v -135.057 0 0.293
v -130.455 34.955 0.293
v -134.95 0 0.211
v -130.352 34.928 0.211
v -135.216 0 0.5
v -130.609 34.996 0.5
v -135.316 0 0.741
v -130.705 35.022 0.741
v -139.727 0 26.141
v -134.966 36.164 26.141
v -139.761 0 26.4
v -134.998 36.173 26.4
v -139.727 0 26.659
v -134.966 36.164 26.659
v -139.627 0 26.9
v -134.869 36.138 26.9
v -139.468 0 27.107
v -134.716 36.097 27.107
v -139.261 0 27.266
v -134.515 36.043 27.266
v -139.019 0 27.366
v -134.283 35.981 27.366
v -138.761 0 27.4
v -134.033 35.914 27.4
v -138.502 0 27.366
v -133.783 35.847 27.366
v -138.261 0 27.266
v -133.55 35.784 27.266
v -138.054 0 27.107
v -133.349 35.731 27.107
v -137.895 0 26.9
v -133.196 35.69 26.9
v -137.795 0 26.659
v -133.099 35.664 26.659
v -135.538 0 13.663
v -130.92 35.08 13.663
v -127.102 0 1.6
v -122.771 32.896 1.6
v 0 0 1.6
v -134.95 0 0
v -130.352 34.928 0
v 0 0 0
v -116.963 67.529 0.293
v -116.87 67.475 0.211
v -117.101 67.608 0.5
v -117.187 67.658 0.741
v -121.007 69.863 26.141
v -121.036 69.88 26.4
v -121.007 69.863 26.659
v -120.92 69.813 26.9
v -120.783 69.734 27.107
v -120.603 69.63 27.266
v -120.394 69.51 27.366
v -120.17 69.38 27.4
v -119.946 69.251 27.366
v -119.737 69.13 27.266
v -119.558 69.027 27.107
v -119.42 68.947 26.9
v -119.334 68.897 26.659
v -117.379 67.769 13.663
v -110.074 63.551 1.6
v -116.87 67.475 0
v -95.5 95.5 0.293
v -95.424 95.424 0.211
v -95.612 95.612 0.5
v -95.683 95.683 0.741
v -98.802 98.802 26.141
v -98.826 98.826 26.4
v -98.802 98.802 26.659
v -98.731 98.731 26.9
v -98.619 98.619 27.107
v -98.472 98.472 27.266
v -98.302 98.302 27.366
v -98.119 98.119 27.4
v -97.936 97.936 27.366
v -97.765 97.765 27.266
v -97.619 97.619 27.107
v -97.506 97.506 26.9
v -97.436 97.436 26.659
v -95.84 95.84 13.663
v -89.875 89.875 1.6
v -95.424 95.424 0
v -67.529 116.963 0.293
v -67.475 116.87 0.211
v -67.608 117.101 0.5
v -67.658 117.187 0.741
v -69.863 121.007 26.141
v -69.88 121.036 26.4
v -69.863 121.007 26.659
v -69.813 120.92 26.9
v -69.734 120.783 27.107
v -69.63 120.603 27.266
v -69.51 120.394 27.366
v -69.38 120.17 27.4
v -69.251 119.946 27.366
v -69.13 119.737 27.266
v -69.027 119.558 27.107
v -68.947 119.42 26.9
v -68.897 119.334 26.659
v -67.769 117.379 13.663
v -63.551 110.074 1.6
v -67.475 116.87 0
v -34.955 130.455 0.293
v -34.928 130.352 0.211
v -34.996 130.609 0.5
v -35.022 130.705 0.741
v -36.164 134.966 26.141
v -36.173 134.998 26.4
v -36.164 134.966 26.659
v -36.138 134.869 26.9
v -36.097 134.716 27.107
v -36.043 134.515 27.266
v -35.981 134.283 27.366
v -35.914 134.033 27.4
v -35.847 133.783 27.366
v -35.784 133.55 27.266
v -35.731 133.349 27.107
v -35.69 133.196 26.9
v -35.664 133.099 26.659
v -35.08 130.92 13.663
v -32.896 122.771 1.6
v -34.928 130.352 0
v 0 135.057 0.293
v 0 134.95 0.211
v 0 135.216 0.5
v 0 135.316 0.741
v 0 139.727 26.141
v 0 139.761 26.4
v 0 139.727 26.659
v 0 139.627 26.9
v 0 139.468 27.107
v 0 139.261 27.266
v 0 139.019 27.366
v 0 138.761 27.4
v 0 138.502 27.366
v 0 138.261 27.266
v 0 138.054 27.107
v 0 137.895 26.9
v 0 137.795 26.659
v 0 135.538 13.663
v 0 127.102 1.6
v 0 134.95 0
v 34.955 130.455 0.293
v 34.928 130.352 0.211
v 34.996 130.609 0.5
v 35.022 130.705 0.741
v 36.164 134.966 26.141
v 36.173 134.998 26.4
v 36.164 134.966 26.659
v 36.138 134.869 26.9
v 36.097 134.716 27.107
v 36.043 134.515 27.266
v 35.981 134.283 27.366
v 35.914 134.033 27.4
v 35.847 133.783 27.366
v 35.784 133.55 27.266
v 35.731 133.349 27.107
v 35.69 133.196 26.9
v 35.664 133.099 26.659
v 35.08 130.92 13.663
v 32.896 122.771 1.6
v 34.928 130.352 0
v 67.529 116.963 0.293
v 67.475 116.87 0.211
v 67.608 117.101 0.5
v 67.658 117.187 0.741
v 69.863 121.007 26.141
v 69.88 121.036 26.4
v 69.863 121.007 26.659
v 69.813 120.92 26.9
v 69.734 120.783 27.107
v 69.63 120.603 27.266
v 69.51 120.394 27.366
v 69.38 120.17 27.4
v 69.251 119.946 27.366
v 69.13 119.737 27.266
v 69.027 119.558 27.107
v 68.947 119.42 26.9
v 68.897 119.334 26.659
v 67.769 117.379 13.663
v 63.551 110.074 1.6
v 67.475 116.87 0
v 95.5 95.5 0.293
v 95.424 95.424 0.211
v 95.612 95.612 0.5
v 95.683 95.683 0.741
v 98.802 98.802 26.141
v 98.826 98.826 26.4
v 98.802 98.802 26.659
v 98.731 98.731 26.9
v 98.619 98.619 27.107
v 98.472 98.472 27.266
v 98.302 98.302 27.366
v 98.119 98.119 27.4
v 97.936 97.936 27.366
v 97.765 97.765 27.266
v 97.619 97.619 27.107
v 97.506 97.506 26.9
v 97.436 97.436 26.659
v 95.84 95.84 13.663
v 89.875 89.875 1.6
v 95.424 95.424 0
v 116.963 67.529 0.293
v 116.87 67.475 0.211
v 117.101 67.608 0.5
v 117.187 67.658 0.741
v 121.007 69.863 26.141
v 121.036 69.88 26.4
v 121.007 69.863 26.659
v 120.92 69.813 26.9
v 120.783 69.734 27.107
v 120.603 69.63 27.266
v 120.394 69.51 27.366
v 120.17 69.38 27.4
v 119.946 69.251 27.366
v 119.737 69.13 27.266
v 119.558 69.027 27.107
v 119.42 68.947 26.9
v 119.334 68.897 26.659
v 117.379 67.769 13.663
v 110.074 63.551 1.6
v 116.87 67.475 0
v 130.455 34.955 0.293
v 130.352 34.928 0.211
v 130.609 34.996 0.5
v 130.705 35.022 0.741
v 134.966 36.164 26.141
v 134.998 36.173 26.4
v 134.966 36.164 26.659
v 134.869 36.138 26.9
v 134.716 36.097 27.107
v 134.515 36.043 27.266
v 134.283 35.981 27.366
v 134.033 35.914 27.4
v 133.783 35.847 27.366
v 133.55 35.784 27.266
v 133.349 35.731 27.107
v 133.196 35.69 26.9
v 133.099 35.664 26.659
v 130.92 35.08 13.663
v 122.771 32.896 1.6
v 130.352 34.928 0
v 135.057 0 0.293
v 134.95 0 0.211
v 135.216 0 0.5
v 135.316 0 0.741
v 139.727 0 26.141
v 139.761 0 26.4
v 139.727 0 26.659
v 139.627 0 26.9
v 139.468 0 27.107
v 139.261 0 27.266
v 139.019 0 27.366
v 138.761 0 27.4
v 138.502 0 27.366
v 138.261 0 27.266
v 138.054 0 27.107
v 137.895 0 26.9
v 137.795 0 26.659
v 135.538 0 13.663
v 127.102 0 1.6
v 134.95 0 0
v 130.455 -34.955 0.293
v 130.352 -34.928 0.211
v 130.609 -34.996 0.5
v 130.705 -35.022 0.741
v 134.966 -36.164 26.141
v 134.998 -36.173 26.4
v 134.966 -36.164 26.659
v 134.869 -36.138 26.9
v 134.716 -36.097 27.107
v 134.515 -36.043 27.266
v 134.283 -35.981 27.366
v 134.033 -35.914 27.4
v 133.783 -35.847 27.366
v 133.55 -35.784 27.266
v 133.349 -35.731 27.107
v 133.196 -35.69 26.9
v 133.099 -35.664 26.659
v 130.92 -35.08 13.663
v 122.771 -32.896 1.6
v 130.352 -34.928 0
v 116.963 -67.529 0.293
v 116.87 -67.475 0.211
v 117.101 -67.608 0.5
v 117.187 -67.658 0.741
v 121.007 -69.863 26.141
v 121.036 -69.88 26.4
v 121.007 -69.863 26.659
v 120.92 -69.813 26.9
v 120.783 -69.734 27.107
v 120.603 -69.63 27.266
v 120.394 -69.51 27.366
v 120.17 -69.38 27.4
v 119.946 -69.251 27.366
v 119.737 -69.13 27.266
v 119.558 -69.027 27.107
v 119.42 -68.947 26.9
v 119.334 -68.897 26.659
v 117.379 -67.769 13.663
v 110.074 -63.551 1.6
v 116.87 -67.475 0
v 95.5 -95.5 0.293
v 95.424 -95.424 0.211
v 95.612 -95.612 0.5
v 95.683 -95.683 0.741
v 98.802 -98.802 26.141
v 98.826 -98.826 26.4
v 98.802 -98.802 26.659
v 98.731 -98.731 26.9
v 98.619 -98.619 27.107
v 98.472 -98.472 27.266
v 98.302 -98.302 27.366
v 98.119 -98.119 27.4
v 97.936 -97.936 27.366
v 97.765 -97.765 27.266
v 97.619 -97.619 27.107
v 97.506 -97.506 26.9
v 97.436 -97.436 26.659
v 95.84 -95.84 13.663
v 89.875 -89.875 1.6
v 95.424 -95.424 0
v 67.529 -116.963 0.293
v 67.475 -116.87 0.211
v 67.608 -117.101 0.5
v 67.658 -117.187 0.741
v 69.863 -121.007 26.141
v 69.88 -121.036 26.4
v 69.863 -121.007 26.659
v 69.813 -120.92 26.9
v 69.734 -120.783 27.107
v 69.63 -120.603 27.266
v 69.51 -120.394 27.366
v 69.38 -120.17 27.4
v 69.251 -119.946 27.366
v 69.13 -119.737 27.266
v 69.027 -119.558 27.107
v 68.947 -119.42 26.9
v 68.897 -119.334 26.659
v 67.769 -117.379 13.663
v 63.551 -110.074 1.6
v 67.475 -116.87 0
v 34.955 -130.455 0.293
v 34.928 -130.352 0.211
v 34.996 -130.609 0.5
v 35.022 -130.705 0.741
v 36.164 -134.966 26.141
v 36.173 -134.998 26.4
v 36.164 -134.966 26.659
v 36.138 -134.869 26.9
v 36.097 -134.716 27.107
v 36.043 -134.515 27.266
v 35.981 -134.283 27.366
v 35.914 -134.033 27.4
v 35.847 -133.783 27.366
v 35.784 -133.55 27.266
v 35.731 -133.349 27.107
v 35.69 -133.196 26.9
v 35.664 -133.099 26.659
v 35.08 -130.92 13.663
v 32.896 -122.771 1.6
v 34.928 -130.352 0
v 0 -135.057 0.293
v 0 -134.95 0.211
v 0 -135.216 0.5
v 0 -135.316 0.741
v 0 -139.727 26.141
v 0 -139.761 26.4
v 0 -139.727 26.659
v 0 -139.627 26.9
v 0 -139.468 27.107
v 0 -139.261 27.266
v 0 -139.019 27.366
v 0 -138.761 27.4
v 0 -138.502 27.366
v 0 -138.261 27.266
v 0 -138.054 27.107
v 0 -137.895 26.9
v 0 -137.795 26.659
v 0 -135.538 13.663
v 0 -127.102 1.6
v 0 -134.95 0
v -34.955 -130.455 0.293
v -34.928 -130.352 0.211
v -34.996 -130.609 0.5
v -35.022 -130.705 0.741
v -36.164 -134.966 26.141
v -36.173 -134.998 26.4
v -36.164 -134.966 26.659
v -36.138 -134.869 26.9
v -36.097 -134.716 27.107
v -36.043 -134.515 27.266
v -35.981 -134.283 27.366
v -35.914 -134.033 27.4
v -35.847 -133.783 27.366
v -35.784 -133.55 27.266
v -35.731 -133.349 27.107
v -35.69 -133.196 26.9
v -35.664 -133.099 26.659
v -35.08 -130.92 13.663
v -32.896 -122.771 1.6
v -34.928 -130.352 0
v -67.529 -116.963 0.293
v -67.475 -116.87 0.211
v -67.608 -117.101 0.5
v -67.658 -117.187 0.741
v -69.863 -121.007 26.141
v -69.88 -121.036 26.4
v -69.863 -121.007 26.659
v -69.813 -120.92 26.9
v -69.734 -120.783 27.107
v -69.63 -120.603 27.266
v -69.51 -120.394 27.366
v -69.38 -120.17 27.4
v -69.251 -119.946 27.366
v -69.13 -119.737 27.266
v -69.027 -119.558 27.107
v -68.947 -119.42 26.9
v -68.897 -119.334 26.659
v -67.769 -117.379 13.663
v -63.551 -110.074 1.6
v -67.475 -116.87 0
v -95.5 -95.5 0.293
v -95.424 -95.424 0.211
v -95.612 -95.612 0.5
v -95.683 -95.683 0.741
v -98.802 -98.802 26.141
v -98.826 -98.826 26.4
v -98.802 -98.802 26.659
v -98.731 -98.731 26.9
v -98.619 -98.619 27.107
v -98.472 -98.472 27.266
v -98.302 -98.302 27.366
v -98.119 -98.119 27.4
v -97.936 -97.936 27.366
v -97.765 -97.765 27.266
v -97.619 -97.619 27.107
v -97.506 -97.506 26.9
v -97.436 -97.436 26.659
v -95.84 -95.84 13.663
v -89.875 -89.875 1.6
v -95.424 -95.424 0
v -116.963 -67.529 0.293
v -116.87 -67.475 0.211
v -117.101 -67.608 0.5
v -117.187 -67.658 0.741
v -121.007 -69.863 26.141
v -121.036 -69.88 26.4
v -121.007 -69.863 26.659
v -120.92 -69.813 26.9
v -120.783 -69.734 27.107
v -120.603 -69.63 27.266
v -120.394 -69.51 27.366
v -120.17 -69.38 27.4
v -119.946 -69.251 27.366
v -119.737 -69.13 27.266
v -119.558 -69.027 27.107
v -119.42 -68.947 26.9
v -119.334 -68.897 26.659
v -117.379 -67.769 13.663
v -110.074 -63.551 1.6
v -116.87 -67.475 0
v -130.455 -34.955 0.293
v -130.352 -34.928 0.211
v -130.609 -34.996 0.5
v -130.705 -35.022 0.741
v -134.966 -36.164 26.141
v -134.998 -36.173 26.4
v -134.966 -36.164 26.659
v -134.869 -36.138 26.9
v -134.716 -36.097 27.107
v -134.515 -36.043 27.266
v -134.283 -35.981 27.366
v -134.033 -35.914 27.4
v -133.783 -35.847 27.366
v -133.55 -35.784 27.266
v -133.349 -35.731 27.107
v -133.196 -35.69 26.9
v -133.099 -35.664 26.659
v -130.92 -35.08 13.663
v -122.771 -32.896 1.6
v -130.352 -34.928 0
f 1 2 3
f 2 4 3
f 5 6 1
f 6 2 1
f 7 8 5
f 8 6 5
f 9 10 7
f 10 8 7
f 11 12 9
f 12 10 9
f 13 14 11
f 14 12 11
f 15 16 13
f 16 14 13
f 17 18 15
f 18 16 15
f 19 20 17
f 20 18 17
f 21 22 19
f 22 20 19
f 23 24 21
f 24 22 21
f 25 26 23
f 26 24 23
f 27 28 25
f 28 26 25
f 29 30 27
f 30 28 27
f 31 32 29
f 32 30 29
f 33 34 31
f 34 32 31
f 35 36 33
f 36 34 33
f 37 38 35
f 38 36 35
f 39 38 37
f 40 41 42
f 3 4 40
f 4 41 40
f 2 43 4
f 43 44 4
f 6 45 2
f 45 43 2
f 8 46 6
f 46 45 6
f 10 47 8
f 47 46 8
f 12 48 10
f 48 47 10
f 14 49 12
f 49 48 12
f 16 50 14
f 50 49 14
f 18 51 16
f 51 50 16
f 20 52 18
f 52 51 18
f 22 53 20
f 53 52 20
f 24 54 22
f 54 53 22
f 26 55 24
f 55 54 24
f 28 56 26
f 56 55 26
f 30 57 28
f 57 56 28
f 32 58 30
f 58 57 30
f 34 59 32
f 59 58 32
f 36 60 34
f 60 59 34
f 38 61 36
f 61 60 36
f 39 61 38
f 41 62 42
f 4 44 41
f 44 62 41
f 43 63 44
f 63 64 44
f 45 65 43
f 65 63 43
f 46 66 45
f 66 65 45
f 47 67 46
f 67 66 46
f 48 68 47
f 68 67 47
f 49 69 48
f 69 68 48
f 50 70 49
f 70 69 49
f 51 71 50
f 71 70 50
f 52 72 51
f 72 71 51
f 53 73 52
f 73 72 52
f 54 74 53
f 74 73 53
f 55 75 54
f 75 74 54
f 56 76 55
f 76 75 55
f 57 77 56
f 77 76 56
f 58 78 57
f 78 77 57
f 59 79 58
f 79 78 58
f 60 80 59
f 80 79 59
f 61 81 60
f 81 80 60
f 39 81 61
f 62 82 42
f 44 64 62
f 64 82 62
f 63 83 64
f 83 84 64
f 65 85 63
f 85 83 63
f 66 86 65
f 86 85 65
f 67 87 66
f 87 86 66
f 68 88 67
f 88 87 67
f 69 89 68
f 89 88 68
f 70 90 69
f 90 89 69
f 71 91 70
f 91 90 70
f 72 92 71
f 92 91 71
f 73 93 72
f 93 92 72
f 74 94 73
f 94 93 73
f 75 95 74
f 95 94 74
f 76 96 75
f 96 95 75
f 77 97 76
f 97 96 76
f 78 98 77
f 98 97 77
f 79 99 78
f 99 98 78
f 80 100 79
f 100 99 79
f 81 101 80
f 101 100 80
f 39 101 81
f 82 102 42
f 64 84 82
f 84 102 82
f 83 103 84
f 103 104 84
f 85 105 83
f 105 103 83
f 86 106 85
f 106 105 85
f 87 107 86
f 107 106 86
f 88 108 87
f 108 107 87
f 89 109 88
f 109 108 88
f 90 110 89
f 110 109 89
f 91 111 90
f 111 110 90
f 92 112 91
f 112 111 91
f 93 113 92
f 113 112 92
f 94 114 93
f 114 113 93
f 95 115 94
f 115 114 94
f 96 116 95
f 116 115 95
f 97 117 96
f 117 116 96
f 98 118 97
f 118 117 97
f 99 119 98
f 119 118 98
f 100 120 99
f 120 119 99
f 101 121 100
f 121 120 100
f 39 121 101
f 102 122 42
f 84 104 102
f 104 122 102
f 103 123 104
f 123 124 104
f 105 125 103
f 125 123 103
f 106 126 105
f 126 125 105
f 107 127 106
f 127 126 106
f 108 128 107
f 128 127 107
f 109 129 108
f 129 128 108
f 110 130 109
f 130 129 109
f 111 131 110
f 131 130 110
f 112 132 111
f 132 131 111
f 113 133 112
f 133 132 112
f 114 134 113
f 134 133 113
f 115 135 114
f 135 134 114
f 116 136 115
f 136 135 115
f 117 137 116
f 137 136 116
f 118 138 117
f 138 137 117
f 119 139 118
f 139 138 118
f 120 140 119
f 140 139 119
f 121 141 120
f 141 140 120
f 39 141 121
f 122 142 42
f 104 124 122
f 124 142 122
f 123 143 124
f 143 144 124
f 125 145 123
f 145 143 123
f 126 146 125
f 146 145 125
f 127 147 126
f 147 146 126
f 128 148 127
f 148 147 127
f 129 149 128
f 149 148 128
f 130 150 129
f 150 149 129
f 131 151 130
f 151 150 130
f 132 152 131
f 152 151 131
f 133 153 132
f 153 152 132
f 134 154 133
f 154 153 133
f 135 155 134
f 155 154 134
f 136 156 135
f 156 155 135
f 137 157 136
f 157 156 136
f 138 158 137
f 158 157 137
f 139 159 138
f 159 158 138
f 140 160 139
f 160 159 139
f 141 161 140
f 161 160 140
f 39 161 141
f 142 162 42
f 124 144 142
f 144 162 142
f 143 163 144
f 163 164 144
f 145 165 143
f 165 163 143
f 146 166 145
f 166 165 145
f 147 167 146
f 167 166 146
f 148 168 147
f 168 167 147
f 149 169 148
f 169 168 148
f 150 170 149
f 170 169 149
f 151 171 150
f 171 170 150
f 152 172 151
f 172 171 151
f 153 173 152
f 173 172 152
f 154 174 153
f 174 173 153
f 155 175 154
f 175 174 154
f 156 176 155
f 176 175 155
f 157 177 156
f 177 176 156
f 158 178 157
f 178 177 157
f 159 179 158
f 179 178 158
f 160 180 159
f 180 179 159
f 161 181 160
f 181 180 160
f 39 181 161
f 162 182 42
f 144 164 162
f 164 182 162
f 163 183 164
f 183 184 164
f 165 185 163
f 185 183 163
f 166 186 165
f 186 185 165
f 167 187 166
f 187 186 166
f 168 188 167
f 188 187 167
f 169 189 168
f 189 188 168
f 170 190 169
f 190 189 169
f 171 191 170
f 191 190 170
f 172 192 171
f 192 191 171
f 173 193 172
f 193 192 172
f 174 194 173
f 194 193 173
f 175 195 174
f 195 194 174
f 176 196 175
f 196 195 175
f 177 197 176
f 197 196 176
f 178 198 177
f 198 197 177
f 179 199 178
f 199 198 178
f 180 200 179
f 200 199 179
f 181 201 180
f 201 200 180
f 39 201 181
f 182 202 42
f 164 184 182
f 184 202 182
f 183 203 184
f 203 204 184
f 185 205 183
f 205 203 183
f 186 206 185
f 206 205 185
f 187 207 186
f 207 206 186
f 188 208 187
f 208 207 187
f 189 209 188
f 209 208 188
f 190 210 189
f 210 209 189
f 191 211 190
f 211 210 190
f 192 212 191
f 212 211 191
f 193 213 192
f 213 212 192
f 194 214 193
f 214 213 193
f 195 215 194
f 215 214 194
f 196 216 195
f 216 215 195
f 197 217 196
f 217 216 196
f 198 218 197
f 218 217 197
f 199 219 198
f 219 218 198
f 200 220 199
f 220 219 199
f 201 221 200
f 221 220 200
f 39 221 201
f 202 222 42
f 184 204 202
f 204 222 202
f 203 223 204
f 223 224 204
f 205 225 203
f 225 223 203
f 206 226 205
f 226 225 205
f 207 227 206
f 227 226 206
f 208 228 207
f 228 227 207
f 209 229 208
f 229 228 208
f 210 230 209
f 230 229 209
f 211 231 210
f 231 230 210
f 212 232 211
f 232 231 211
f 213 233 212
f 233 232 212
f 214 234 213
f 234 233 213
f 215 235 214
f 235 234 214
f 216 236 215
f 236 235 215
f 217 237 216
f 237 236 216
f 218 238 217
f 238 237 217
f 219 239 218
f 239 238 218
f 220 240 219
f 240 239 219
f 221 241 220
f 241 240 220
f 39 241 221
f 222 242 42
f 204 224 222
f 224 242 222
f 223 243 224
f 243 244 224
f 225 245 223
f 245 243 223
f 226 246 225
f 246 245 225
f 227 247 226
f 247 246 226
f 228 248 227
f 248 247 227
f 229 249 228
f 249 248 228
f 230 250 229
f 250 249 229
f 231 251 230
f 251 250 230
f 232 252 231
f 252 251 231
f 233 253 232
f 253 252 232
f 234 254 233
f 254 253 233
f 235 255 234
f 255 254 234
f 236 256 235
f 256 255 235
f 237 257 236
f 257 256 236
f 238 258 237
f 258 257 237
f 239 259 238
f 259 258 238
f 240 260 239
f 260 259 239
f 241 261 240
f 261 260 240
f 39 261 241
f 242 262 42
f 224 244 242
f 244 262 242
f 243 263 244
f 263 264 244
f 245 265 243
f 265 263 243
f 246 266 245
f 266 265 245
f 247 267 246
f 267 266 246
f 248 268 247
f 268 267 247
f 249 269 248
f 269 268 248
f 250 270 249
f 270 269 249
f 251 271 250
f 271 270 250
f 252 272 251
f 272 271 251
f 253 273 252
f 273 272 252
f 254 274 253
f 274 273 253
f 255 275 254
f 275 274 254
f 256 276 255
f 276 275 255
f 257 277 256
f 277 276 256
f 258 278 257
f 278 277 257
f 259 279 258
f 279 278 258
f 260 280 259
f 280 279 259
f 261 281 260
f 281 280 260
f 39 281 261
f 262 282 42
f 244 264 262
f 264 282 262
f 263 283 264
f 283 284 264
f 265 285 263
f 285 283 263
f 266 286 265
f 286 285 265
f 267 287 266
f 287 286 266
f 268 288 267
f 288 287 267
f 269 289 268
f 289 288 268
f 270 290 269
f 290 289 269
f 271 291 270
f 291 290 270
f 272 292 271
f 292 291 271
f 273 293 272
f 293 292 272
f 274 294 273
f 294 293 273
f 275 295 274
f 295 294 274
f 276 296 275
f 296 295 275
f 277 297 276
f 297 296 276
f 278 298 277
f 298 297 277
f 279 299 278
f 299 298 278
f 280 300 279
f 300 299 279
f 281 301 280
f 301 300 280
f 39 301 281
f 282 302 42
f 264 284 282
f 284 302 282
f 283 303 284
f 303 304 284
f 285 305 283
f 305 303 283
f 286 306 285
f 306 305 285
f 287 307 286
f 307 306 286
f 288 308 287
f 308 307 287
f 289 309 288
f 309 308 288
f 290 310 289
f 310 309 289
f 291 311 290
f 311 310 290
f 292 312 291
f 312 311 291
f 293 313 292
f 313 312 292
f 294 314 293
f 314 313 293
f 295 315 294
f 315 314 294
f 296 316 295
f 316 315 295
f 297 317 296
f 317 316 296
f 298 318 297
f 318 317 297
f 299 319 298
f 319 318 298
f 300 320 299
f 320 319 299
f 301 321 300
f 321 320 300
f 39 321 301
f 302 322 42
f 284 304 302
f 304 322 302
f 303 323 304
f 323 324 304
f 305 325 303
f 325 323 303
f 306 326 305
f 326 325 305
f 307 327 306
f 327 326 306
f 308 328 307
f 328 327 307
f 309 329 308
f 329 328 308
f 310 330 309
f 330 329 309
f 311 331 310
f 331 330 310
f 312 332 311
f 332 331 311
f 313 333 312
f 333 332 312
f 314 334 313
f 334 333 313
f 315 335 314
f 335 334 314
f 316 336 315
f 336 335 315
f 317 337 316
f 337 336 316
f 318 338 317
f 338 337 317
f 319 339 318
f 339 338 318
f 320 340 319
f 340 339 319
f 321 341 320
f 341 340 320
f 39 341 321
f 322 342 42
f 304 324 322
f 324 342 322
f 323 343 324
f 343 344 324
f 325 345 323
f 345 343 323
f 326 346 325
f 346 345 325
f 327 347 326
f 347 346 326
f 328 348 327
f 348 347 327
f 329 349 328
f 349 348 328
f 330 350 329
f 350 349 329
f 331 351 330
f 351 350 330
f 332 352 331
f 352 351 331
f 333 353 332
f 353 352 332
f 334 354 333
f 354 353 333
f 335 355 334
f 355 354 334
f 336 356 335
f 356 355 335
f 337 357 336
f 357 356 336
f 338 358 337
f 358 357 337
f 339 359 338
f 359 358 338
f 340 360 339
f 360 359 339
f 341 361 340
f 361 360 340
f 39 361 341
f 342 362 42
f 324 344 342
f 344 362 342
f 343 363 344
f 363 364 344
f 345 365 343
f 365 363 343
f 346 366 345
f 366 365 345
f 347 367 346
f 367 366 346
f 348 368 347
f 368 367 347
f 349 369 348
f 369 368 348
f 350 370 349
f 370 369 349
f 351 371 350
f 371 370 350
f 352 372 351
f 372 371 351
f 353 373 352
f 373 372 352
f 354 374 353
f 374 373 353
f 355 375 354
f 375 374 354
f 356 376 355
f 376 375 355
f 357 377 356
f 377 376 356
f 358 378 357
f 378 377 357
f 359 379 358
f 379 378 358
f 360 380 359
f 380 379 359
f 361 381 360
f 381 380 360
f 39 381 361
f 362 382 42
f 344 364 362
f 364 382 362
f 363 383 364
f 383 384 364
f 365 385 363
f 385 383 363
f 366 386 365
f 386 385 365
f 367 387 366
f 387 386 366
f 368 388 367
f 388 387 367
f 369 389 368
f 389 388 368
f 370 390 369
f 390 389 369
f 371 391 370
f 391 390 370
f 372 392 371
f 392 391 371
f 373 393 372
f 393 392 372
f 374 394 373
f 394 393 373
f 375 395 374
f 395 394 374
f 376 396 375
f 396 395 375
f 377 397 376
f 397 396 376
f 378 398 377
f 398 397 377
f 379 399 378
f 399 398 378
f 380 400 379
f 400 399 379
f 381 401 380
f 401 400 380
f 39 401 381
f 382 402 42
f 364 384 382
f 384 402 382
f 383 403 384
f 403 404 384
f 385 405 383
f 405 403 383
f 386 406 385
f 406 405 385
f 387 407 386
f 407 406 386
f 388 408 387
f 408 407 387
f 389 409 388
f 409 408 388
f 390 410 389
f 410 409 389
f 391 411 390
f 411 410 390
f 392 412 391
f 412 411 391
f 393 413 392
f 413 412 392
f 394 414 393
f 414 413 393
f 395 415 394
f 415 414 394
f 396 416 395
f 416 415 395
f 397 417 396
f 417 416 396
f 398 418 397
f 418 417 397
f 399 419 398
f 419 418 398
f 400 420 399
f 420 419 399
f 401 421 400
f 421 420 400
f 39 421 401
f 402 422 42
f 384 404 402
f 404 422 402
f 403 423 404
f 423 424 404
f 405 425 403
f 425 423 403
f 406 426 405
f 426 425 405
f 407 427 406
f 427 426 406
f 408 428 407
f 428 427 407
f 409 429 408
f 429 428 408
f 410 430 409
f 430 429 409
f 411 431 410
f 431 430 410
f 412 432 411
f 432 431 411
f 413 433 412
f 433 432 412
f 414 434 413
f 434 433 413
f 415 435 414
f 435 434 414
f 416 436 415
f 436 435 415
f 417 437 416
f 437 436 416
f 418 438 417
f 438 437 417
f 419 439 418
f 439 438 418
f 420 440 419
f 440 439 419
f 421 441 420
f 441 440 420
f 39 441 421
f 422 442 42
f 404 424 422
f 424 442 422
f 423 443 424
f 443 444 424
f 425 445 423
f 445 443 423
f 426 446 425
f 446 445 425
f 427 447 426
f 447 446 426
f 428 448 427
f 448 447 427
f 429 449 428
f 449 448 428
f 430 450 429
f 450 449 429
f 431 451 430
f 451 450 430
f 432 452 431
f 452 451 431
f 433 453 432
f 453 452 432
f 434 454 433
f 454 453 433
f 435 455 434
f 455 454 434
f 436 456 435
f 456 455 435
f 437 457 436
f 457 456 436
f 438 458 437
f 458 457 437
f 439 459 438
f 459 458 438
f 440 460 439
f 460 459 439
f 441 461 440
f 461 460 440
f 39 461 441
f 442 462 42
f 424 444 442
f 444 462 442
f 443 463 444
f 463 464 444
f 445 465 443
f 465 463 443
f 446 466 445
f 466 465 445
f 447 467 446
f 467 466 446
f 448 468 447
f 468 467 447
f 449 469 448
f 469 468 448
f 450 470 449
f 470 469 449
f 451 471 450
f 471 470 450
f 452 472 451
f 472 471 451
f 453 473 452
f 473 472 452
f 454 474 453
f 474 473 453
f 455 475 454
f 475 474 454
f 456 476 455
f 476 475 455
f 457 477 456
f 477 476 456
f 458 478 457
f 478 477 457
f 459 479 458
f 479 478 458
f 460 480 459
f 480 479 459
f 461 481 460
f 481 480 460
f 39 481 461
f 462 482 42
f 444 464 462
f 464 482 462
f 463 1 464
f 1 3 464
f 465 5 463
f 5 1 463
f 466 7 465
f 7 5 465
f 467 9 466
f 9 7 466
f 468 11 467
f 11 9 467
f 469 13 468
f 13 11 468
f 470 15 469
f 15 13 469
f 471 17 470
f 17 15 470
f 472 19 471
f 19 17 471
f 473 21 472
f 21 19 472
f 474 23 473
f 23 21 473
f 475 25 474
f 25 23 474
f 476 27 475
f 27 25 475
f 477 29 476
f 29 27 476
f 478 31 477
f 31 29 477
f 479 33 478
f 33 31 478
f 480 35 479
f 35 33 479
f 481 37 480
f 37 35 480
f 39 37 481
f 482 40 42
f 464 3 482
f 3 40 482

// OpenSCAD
/* 
sacuers for planters.
Design 1
just a spacer under the planter to protect the wood.

design 2
a saucer that captures drained.
*/
$fn=24;
NozzleWidth = 1.0;
LayerHeight = 0.24;
InitialLayerHeight = 0.4;
mmPerInch = 25.4;
wallCount = 2;

function InchTomm(inches = 1) = inches * mmPerInch;
function height2layers(mm = 1) = mm/LayerHeight;
function layers2Height(layers) = InitialLayerHeight + ((layers - 1) * LayerHeight);
function BaseHeight() = layers2Height(6);
function WallThickness(count) = count * NozzleWidth;

Build();

module Build()
{
    Saucer(radius = InchTomm(10.5)/2, depth = mmPerInch, thickness = BaseHeight());
}

module Saucer(radius = 100, depth = mmPerInch, thickness = BaseHeight()) 
{
    rotate_extrude(convexity=10) 
    {
        union()
        {
            hull() 
            {
                translate([radius, 0, 0]) 
                    square(size=[thickness, thickness], center=false);

                square(size=[thickness, thickness], center=false);        
            }
            translate([radius +  WallThickness( wallCount ) / 2, WallThickness( wallCount ) / 2, 0])
            hull()
            {
                translate([sin(10) * depth, depth, 0]) 
                circle(r = WallThickness( wallCount ) / 2); 
                circle(r = WallThickness( wallCount ) / 2);                
            }   

            // rotate([0,0,230])
            translate([0, WallThickness( wallCount ) / 2, 0])
            polygon(points = [[radius - radius/20, 0], [radius, 0], [radius + (depth * sin(5)), depth/2]]);     
        }        
    }

}

function StepSize(stepsize) = stepsize * 180/$fn;
function polySinWave(width, height) =
[
    for(x =[0 : StepSize(1) : 181]) [ x * width/90,  sin(x) * height]
];
